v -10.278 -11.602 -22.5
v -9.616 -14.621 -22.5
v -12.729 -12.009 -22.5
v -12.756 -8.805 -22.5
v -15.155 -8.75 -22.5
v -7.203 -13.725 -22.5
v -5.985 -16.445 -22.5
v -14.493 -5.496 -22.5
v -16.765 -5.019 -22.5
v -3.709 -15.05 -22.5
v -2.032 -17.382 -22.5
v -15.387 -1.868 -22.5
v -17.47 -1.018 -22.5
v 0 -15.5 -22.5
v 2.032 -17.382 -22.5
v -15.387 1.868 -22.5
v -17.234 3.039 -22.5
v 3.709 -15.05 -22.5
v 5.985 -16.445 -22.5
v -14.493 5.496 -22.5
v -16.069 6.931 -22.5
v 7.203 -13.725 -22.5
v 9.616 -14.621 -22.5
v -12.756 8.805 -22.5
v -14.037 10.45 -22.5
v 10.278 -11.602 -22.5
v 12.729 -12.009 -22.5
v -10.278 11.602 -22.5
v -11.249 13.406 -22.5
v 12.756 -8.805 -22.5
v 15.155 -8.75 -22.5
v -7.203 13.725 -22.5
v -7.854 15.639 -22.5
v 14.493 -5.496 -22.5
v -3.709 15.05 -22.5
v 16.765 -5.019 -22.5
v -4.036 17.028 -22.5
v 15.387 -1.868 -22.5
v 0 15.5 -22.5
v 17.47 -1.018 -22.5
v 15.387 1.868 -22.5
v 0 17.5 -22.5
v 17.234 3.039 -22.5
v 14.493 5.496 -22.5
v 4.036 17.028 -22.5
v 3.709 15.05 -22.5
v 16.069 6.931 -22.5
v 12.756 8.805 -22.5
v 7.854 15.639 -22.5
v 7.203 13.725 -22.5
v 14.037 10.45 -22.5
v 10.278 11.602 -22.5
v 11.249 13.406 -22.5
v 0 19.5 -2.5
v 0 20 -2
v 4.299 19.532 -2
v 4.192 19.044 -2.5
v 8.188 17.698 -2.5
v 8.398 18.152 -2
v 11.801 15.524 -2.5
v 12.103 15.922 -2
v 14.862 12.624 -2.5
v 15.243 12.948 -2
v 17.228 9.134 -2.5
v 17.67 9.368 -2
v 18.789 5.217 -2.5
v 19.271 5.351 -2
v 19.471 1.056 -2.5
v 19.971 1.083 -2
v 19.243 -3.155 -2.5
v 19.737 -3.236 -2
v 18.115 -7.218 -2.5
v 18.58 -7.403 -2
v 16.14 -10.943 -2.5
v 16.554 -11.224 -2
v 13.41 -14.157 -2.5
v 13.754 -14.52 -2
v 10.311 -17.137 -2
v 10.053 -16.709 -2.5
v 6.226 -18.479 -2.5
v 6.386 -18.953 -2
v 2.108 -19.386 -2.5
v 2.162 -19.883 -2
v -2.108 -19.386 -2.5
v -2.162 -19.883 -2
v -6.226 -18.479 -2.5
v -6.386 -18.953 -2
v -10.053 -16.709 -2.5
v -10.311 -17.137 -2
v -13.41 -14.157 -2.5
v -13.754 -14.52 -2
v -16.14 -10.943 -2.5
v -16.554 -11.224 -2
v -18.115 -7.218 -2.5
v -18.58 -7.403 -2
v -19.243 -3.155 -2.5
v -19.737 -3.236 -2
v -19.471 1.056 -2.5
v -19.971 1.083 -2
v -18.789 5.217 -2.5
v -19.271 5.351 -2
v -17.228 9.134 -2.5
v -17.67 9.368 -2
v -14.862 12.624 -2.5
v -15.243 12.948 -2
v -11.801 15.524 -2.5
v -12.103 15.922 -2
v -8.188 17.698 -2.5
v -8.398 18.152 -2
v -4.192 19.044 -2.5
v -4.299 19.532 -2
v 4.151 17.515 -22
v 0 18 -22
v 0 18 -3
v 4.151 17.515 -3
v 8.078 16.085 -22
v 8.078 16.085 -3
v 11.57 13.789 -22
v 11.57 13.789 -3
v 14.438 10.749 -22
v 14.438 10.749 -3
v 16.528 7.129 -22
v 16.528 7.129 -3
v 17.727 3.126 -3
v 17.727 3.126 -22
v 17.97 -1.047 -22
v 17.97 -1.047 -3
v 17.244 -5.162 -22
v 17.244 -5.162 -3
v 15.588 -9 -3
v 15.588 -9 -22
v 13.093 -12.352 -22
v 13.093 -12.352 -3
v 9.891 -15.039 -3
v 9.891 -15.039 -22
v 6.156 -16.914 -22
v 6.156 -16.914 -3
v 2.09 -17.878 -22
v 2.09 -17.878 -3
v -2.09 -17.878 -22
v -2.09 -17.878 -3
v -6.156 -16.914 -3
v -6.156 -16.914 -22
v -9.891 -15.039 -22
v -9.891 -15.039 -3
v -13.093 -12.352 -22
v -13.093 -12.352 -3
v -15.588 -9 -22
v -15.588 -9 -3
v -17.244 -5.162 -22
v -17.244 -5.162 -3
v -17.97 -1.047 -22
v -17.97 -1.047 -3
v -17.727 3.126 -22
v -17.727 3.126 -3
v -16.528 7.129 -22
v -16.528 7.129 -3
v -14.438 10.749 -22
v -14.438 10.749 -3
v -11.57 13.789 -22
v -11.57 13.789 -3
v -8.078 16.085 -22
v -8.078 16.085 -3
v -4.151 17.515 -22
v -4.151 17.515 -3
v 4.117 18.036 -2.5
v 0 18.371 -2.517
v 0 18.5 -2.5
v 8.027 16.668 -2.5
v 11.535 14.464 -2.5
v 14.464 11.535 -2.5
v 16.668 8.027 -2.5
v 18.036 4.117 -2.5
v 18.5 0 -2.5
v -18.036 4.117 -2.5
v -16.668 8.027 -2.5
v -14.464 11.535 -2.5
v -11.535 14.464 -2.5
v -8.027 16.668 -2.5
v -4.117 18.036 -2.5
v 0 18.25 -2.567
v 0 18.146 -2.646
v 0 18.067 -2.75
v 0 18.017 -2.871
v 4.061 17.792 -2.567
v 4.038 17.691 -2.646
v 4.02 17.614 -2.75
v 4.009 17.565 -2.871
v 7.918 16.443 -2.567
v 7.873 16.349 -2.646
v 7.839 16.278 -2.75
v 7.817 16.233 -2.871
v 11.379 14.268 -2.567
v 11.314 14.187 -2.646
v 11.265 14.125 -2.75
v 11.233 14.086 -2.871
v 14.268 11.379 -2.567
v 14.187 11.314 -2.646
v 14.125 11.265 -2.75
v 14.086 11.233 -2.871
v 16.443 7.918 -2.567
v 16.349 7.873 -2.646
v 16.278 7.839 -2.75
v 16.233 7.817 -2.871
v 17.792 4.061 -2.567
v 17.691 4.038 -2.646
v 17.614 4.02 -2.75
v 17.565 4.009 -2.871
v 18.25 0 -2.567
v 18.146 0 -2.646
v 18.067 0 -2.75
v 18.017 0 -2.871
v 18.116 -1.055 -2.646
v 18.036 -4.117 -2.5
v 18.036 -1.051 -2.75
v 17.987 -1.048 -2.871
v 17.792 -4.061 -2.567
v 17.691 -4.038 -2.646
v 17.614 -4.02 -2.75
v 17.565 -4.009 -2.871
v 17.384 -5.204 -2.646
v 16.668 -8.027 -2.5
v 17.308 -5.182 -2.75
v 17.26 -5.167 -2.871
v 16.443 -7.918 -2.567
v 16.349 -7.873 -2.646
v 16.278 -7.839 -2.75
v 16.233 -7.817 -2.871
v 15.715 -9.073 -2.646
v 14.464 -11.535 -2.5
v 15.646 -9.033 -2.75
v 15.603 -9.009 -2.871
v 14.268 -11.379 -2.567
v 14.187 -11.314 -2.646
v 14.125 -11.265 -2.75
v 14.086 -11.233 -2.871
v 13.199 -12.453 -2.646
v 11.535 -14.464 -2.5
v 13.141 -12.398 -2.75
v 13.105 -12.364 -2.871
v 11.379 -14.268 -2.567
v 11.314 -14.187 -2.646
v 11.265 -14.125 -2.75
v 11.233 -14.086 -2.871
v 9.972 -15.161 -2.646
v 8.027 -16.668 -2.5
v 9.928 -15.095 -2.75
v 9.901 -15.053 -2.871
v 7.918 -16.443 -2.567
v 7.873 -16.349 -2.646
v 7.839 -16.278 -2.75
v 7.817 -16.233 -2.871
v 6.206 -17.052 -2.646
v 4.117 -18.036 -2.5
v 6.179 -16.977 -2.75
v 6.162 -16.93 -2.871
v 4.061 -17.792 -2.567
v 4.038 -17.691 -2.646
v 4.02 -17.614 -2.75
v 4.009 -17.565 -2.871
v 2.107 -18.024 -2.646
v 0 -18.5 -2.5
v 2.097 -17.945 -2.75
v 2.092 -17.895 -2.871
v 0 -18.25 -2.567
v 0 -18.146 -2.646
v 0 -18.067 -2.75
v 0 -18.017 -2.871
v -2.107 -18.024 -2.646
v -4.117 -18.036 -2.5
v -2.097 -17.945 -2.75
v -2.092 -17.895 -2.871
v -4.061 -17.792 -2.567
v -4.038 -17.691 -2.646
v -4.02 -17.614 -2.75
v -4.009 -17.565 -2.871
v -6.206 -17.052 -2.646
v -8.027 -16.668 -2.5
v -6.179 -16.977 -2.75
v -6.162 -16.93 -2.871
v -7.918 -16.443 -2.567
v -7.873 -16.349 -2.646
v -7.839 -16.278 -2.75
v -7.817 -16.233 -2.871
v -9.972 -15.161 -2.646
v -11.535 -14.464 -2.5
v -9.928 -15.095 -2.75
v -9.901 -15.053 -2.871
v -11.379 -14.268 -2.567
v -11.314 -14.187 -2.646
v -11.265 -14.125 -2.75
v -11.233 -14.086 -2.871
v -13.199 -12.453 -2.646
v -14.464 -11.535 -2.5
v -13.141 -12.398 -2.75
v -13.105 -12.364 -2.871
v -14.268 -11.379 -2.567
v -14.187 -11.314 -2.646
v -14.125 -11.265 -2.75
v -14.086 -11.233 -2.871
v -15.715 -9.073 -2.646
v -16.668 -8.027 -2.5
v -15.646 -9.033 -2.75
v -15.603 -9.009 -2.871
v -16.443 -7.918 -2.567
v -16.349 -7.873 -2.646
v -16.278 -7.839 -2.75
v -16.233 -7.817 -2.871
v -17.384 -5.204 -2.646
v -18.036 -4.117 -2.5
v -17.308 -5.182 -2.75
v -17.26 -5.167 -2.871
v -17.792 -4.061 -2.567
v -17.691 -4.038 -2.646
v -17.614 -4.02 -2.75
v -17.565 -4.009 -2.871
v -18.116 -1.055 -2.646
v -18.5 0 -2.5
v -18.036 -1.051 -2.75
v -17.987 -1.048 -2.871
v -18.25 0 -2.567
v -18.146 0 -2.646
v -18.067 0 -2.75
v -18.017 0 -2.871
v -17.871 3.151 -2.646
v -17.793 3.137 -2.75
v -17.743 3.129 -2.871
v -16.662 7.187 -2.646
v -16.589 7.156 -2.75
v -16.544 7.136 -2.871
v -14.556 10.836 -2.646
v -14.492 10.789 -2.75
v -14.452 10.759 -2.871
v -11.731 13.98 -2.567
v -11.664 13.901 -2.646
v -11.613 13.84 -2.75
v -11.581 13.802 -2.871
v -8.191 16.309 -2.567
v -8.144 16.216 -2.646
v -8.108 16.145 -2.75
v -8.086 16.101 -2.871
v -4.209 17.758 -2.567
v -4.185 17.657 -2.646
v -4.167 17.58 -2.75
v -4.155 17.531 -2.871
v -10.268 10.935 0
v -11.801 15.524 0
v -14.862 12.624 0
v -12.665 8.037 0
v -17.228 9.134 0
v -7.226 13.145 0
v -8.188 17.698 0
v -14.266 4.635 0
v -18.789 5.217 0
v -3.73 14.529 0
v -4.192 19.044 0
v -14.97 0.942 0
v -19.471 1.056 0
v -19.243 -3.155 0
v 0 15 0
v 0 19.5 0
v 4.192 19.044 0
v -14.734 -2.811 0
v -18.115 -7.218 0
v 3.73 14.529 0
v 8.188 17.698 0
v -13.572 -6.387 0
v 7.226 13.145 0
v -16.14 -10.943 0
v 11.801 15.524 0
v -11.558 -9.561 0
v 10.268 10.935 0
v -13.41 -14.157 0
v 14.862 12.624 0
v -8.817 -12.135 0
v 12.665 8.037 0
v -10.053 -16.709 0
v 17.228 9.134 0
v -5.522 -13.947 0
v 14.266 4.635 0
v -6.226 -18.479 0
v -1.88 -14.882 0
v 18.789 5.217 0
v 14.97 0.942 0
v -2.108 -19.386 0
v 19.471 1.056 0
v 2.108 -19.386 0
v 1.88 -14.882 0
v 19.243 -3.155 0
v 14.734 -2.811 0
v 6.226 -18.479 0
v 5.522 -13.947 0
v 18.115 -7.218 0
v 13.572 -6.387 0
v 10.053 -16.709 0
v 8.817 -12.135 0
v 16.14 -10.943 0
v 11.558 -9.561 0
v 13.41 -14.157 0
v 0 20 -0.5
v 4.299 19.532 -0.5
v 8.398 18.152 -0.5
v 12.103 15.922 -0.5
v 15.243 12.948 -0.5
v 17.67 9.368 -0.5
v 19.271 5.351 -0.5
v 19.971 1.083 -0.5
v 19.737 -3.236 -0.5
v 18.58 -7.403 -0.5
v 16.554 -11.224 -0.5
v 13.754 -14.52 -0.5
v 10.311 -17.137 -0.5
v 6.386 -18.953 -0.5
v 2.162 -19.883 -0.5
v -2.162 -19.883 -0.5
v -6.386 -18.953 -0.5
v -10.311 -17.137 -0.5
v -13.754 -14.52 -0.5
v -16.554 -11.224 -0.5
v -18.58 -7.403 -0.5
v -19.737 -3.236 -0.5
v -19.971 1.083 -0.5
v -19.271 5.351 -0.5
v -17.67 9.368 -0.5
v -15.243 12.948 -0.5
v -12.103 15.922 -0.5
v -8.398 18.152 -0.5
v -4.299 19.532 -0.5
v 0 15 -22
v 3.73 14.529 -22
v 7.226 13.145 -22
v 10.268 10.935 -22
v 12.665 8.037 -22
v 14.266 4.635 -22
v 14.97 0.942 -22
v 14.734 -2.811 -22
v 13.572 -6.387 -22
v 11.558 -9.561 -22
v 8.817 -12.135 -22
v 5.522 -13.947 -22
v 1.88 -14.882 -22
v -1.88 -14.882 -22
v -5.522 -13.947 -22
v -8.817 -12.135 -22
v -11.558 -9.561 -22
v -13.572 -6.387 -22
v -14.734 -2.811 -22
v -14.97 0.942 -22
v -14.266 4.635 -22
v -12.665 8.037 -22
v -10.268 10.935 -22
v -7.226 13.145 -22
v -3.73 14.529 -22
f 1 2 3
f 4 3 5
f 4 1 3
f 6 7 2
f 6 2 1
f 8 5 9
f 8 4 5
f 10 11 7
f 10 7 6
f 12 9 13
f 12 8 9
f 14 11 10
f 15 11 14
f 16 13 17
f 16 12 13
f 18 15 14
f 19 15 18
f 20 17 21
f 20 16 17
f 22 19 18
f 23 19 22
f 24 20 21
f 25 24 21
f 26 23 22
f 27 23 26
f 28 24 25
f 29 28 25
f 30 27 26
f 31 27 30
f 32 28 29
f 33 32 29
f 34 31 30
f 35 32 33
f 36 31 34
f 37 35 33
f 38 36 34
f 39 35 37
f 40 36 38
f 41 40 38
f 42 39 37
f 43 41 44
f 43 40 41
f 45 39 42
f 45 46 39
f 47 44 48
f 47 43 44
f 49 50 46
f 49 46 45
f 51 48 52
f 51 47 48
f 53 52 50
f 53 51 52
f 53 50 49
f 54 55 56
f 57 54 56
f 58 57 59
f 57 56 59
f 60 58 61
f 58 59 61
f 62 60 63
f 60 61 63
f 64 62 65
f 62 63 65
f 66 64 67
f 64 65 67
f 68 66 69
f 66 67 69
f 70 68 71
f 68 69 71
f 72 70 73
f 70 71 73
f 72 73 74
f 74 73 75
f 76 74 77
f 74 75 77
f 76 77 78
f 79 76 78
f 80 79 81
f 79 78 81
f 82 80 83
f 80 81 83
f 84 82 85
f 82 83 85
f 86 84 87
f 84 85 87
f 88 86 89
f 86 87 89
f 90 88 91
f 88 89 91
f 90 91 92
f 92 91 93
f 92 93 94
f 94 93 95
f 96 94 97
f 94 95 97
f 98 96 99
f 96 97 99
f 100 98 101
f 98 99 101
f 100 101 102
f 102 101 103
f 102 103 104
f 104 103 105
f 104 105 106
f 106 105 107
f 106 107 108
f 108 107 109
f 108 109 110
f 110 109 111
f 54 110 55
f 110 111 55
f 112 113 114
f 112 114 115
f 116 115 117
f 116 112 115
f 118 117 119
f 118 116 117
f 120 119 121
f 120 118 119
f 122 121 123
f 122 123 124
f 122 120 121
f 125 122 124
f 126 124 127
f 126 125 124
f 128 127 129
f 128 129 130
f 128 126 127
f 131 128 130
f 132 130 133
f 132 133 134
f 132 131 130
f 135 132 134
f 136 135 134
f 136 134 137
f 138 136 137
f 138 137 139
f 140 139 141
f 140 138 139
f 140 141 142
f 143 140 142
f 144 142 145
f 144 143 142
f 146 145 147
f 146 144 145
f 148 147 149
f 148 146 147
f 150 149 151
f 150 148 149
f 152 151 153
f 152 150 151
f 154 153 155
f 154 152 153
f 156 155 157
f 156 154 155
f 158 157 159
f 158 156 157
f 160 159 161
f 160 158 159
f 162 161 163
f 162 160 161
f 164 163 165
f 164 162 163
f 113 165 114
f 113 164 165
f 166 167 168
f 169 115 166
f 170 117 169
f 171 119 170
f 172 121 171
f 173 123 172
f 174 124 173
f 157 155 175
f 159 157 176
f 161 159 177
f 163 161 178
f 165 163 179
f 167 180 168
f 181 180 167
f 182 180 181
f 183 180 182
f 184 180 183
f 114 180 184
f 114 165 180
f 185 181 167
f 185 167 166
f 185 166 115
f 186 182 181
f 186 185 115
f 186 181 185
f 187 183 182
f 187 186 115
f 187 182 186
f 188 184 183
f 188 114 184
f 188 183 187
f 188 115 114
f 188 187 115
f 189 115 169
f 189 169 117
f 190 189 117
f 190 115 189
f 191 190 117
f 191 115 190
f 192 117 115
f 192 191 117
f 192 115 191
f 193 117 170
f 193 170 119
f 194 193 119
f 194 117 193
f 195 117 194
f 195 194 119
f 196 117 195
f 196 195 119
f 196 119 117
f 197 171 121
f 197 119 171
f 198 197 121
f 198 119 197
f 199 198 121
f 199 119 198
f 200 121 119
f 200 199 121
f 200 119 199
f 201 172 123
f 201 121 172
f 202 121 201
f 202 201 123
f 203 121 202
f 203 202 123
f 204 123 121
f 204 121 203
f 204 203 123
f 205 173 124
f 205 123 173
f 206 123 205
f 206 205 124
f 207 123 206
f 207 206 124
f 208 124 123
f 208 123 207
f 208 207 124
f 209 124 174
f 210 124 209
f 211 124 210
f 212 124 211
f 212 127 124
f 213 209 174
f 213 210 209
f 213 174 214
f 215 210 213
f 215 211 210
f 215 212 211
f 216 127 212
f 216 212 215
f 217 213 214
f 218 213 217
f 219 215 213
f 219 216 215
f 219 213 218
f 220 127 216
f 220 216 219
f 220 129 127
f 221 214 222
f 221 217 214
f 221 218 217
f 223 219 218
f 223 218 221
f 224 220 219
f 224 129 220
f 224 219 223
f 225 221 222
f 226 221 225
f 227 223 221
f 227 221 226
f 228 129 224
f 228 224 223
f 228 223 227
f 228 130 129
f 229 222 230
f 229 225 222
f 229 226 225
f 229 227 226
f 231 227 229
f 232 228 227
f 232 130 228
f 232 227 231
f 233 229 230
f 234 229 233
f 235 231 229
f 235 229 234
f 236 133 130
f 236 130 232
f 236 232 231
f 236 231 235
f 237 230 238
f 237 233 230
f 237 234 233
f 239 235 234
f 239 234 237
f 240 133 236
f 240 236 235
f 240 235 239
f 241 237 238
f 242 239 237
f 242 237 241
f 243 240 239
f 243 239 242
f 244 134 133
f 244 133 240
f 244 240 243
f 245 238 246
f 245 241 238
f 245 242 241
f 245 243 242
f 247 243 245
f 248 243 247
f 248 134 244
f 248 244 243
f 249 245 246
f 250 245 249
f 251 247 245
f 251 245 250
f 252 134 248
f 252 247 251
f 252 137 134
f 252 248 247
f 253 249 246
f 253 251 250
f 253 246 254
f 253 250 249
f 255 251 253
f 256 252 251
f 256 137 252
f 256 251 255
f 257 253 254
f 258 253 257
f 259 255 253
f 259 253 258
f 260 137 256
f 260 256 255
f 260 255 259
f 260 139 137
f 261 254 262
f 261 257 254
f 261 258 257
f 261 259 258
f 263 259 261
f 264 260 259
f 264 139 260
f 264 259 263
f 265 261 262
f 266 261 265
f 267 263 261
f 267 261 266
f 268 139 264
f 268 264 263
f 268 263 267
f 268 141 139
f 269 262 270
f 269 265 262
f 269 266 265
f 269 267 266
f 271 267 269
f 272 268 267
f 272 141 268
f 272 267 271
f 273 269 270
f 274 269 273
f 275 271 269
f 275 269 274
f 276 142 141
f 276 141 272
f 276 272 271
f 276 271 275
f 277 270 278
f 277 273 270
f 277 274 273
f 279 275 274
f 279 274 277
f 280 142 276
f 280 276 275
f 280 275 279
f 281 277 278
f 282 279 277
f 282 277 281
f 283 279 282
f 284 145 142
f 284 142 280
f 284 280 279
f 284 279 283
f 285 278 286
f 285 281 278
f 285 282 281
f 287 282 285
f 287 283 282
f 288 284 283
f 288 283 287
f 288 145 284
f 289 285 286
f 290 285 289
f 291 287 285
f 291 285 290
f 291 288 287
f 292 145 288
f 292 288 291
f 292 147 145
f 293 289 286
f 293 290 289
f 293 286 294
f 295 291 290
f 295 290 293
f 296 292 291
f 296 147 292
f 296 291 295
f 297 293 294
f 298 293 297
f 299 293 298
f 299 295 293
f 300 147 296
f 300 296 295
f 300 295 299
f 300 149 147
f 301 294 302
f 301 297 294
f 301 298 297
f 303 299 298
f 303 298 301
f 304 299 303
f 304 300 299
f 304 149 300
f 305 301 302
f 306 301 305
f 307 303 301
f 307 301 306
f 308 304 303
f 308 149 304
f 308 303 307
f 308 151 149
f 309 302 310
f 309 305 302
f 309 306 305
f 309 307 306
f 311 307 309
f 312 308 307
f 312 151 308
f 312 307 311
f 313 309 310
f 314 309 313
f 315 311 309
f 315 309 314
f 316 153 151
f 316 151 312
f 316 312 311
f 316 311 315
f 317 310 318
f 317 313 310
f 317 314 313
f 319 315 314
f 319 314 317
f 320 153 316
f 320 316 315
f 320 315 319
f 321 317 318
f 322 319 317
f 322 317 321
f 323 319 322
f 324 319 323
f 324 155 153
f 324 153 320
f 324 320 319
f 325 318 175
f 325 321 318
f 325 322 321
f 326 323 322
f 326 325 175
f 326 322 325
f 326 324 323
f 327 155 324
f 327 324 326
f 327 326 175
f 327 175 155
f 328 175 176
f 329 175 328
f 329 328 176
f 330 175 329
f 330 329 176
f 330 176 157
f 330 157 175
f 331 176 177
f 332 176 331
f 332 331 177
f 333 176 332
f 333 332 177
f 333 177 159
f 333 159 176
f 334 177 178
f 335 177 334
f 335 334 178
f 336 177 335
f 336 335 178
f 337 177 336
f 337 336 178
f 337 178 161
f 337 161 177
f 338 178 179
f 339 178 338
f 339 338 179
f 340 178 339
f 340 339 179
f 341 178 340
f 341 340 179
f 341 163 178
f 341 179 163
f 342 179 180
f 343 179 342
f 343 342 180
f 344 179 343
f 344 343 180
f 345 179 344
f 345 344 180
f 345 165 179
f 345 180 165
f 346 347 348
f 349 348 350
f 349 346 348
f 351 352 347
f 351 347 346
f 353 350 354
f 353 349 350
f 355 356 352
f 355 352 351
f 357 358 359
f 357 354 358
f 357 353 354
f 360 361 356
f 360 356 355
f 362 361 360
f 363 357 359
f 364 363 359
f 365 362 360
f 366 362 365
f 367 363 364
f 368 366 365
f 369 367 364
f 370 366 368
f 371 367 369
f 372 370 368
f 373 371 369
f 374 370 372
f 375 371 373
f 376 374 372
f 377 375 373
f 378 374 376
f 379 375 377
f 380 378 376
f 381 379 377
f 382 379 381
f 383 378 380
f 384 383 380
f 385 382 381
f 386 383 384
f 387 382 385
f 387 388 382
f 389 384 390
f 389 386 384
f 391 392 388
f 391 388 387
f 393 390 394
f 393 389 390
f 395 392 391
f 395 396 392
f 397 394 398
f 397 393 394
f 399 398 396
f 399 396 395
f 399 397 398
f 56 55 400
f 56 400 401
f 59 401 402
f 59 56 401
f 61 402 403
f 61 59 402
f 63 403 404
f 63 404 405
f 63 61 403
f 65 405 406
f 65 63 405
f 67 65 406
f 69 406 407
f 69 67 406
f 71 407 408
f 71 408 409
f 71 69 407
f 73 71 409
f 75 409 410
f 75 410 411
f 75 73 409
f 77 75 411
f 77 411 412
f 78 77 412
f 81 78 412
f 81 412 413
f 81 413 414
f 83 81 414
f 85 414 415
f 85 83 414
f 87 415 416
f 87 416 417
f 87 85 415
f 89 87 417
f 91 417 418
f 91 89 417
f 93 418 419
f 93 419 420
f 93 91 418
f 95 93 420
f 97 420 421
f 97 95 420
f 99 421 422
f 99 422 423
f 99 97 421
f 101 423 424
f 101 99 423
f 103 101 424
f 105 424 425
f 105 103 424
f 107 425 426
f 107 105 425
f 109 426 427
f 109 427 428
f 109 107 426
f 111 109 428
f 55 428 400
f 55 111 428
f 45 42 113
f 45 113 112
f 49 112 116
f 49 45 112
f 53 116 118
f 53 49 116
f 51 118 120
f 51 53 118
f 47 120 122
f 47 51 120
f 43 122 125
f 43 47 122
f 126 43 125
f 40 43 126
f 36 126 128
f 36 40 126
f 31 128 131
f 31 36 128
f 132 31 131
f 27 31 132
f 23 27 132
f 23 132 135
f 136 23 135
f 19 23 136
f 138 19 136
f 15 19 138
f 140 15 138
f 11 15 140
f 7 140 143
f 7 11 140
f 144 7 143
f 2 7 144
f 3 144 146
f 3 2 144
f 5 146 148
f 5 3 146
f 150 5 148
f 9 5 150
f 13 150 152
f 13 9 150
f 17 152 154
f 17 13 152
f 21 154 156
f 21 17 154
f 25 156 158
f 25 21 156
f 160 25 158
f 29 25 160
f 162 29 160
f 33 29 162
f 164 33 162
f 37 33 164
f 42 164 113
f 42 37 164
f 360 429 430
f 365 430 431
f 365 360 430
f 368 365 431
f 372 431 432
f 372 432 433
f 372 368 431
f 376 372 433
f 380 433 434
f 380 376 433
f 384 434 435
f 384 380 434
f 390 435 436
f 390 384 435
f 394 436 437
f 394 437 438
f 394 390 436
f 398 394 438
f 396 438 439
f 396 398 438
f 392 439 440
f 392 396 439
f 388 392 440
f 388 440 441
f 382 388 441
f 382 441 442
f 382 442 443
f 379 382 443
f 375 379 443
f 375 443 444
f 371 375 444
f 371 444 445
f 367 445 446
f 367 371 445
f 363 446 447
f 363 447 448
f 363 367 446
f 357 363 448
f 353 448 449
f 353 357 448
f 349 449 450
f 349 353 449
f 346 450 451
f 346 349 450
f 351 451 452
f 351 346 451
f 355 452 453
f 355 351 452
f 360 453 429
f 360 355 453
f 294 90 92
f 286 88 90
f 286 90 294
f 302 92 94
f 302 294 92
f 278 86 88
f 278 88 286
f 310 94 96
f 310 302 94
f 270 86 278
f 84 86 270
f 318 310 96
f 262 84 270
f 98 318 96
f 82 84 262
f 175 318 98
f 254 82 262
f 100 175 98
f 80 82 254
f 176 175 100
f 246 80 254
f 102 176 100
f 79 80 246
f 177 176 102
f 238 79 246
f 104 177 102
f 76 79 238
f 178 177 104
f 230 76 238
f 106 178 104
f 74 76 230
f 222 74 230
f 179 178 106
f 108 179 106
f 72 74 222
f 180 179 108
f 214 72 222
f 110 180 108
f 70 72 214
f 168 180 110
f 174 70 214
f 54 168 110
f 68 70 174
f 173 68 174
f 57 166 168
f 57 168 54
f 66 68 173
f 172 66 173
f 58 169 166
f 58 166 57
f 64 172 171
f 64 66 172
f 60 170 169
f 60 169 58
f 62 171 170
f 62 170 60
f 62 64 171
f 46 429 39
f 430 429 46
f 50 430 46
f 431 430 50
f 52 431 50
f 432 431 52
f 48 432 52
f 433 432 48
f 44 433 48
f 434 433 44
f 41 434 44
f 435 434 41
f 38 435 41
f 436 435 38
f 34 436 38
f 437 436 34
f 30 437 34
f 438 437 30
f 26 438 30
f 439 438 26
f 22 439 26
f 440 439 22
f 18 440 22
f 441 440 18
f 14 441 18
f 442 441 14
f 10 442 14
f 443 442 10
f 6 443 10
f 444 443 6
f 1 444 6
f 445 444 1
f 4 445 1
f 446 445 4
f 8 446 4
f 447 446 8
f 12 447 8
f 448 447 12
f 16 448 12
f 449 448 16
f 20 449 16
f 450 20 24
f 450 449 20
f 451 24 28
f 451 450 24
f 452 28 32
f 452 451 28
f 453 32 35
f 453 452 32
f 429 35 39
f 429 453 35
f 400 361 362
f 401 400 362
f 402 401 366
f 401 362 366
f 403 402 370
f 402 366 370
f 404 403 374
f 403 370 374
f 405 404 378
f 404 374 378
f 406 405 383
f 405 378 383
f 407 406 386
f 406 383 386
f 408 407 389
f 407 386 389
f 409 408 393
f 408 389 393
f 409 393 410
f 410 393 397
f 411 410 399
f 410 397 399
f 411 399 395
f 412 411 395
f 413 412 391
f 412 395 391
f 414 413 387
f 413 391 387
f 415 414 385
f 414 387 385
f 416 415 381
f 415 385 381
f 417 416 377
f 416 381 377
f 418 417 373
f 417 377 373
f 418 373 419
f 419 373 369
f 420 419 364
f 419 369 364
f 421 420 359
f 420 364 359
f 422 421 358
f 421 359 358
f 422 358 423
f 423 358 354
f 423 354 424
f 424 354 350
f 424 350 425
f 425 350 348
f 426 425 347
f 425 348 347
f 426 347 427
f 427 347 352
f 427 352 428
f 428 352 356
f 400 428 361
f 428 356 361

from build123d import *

# Parameters (mm, degrees)
FILLET1_R     = 0.5
CHAMFER1_SIZE = 0.5


with BuildPart() as part:
    # Sketch1 → Revolve1 (revolve)
    with BuildSketch(Plane(origin=(0, 0, 0), x_dir=(0, 0, -1), z_dir=(1, 0, 0))):
        Polygon((0, 15), (0, 20), (2.5, 20), (2.5, 18), (22.5, 18), (22.5, 15), align=None)
    revolve(axis=Axis((0, 0, 38.983478261), (0, 0, -1)))

    # Fillet1
    fillet1_edges = [part.edges().sort_by_distance(p)[0] for p in [
        (0, -18, -2.5),
    ]]
    fillet(fillet1_edges, radius=FILLET1_R)

    # Chamfer1
    chamfer1_edges = [part.edges().sort_by_distance(p)[0] for p in [
        (0, -20, -2.5),
        (0, -20, 0),
        (0, -18, -22.5),
        (0, -15, -22.5),
    ]]
    chamfer(chamfer1_edges, length=CHAMFER1_SIZE)


solid = part.part
